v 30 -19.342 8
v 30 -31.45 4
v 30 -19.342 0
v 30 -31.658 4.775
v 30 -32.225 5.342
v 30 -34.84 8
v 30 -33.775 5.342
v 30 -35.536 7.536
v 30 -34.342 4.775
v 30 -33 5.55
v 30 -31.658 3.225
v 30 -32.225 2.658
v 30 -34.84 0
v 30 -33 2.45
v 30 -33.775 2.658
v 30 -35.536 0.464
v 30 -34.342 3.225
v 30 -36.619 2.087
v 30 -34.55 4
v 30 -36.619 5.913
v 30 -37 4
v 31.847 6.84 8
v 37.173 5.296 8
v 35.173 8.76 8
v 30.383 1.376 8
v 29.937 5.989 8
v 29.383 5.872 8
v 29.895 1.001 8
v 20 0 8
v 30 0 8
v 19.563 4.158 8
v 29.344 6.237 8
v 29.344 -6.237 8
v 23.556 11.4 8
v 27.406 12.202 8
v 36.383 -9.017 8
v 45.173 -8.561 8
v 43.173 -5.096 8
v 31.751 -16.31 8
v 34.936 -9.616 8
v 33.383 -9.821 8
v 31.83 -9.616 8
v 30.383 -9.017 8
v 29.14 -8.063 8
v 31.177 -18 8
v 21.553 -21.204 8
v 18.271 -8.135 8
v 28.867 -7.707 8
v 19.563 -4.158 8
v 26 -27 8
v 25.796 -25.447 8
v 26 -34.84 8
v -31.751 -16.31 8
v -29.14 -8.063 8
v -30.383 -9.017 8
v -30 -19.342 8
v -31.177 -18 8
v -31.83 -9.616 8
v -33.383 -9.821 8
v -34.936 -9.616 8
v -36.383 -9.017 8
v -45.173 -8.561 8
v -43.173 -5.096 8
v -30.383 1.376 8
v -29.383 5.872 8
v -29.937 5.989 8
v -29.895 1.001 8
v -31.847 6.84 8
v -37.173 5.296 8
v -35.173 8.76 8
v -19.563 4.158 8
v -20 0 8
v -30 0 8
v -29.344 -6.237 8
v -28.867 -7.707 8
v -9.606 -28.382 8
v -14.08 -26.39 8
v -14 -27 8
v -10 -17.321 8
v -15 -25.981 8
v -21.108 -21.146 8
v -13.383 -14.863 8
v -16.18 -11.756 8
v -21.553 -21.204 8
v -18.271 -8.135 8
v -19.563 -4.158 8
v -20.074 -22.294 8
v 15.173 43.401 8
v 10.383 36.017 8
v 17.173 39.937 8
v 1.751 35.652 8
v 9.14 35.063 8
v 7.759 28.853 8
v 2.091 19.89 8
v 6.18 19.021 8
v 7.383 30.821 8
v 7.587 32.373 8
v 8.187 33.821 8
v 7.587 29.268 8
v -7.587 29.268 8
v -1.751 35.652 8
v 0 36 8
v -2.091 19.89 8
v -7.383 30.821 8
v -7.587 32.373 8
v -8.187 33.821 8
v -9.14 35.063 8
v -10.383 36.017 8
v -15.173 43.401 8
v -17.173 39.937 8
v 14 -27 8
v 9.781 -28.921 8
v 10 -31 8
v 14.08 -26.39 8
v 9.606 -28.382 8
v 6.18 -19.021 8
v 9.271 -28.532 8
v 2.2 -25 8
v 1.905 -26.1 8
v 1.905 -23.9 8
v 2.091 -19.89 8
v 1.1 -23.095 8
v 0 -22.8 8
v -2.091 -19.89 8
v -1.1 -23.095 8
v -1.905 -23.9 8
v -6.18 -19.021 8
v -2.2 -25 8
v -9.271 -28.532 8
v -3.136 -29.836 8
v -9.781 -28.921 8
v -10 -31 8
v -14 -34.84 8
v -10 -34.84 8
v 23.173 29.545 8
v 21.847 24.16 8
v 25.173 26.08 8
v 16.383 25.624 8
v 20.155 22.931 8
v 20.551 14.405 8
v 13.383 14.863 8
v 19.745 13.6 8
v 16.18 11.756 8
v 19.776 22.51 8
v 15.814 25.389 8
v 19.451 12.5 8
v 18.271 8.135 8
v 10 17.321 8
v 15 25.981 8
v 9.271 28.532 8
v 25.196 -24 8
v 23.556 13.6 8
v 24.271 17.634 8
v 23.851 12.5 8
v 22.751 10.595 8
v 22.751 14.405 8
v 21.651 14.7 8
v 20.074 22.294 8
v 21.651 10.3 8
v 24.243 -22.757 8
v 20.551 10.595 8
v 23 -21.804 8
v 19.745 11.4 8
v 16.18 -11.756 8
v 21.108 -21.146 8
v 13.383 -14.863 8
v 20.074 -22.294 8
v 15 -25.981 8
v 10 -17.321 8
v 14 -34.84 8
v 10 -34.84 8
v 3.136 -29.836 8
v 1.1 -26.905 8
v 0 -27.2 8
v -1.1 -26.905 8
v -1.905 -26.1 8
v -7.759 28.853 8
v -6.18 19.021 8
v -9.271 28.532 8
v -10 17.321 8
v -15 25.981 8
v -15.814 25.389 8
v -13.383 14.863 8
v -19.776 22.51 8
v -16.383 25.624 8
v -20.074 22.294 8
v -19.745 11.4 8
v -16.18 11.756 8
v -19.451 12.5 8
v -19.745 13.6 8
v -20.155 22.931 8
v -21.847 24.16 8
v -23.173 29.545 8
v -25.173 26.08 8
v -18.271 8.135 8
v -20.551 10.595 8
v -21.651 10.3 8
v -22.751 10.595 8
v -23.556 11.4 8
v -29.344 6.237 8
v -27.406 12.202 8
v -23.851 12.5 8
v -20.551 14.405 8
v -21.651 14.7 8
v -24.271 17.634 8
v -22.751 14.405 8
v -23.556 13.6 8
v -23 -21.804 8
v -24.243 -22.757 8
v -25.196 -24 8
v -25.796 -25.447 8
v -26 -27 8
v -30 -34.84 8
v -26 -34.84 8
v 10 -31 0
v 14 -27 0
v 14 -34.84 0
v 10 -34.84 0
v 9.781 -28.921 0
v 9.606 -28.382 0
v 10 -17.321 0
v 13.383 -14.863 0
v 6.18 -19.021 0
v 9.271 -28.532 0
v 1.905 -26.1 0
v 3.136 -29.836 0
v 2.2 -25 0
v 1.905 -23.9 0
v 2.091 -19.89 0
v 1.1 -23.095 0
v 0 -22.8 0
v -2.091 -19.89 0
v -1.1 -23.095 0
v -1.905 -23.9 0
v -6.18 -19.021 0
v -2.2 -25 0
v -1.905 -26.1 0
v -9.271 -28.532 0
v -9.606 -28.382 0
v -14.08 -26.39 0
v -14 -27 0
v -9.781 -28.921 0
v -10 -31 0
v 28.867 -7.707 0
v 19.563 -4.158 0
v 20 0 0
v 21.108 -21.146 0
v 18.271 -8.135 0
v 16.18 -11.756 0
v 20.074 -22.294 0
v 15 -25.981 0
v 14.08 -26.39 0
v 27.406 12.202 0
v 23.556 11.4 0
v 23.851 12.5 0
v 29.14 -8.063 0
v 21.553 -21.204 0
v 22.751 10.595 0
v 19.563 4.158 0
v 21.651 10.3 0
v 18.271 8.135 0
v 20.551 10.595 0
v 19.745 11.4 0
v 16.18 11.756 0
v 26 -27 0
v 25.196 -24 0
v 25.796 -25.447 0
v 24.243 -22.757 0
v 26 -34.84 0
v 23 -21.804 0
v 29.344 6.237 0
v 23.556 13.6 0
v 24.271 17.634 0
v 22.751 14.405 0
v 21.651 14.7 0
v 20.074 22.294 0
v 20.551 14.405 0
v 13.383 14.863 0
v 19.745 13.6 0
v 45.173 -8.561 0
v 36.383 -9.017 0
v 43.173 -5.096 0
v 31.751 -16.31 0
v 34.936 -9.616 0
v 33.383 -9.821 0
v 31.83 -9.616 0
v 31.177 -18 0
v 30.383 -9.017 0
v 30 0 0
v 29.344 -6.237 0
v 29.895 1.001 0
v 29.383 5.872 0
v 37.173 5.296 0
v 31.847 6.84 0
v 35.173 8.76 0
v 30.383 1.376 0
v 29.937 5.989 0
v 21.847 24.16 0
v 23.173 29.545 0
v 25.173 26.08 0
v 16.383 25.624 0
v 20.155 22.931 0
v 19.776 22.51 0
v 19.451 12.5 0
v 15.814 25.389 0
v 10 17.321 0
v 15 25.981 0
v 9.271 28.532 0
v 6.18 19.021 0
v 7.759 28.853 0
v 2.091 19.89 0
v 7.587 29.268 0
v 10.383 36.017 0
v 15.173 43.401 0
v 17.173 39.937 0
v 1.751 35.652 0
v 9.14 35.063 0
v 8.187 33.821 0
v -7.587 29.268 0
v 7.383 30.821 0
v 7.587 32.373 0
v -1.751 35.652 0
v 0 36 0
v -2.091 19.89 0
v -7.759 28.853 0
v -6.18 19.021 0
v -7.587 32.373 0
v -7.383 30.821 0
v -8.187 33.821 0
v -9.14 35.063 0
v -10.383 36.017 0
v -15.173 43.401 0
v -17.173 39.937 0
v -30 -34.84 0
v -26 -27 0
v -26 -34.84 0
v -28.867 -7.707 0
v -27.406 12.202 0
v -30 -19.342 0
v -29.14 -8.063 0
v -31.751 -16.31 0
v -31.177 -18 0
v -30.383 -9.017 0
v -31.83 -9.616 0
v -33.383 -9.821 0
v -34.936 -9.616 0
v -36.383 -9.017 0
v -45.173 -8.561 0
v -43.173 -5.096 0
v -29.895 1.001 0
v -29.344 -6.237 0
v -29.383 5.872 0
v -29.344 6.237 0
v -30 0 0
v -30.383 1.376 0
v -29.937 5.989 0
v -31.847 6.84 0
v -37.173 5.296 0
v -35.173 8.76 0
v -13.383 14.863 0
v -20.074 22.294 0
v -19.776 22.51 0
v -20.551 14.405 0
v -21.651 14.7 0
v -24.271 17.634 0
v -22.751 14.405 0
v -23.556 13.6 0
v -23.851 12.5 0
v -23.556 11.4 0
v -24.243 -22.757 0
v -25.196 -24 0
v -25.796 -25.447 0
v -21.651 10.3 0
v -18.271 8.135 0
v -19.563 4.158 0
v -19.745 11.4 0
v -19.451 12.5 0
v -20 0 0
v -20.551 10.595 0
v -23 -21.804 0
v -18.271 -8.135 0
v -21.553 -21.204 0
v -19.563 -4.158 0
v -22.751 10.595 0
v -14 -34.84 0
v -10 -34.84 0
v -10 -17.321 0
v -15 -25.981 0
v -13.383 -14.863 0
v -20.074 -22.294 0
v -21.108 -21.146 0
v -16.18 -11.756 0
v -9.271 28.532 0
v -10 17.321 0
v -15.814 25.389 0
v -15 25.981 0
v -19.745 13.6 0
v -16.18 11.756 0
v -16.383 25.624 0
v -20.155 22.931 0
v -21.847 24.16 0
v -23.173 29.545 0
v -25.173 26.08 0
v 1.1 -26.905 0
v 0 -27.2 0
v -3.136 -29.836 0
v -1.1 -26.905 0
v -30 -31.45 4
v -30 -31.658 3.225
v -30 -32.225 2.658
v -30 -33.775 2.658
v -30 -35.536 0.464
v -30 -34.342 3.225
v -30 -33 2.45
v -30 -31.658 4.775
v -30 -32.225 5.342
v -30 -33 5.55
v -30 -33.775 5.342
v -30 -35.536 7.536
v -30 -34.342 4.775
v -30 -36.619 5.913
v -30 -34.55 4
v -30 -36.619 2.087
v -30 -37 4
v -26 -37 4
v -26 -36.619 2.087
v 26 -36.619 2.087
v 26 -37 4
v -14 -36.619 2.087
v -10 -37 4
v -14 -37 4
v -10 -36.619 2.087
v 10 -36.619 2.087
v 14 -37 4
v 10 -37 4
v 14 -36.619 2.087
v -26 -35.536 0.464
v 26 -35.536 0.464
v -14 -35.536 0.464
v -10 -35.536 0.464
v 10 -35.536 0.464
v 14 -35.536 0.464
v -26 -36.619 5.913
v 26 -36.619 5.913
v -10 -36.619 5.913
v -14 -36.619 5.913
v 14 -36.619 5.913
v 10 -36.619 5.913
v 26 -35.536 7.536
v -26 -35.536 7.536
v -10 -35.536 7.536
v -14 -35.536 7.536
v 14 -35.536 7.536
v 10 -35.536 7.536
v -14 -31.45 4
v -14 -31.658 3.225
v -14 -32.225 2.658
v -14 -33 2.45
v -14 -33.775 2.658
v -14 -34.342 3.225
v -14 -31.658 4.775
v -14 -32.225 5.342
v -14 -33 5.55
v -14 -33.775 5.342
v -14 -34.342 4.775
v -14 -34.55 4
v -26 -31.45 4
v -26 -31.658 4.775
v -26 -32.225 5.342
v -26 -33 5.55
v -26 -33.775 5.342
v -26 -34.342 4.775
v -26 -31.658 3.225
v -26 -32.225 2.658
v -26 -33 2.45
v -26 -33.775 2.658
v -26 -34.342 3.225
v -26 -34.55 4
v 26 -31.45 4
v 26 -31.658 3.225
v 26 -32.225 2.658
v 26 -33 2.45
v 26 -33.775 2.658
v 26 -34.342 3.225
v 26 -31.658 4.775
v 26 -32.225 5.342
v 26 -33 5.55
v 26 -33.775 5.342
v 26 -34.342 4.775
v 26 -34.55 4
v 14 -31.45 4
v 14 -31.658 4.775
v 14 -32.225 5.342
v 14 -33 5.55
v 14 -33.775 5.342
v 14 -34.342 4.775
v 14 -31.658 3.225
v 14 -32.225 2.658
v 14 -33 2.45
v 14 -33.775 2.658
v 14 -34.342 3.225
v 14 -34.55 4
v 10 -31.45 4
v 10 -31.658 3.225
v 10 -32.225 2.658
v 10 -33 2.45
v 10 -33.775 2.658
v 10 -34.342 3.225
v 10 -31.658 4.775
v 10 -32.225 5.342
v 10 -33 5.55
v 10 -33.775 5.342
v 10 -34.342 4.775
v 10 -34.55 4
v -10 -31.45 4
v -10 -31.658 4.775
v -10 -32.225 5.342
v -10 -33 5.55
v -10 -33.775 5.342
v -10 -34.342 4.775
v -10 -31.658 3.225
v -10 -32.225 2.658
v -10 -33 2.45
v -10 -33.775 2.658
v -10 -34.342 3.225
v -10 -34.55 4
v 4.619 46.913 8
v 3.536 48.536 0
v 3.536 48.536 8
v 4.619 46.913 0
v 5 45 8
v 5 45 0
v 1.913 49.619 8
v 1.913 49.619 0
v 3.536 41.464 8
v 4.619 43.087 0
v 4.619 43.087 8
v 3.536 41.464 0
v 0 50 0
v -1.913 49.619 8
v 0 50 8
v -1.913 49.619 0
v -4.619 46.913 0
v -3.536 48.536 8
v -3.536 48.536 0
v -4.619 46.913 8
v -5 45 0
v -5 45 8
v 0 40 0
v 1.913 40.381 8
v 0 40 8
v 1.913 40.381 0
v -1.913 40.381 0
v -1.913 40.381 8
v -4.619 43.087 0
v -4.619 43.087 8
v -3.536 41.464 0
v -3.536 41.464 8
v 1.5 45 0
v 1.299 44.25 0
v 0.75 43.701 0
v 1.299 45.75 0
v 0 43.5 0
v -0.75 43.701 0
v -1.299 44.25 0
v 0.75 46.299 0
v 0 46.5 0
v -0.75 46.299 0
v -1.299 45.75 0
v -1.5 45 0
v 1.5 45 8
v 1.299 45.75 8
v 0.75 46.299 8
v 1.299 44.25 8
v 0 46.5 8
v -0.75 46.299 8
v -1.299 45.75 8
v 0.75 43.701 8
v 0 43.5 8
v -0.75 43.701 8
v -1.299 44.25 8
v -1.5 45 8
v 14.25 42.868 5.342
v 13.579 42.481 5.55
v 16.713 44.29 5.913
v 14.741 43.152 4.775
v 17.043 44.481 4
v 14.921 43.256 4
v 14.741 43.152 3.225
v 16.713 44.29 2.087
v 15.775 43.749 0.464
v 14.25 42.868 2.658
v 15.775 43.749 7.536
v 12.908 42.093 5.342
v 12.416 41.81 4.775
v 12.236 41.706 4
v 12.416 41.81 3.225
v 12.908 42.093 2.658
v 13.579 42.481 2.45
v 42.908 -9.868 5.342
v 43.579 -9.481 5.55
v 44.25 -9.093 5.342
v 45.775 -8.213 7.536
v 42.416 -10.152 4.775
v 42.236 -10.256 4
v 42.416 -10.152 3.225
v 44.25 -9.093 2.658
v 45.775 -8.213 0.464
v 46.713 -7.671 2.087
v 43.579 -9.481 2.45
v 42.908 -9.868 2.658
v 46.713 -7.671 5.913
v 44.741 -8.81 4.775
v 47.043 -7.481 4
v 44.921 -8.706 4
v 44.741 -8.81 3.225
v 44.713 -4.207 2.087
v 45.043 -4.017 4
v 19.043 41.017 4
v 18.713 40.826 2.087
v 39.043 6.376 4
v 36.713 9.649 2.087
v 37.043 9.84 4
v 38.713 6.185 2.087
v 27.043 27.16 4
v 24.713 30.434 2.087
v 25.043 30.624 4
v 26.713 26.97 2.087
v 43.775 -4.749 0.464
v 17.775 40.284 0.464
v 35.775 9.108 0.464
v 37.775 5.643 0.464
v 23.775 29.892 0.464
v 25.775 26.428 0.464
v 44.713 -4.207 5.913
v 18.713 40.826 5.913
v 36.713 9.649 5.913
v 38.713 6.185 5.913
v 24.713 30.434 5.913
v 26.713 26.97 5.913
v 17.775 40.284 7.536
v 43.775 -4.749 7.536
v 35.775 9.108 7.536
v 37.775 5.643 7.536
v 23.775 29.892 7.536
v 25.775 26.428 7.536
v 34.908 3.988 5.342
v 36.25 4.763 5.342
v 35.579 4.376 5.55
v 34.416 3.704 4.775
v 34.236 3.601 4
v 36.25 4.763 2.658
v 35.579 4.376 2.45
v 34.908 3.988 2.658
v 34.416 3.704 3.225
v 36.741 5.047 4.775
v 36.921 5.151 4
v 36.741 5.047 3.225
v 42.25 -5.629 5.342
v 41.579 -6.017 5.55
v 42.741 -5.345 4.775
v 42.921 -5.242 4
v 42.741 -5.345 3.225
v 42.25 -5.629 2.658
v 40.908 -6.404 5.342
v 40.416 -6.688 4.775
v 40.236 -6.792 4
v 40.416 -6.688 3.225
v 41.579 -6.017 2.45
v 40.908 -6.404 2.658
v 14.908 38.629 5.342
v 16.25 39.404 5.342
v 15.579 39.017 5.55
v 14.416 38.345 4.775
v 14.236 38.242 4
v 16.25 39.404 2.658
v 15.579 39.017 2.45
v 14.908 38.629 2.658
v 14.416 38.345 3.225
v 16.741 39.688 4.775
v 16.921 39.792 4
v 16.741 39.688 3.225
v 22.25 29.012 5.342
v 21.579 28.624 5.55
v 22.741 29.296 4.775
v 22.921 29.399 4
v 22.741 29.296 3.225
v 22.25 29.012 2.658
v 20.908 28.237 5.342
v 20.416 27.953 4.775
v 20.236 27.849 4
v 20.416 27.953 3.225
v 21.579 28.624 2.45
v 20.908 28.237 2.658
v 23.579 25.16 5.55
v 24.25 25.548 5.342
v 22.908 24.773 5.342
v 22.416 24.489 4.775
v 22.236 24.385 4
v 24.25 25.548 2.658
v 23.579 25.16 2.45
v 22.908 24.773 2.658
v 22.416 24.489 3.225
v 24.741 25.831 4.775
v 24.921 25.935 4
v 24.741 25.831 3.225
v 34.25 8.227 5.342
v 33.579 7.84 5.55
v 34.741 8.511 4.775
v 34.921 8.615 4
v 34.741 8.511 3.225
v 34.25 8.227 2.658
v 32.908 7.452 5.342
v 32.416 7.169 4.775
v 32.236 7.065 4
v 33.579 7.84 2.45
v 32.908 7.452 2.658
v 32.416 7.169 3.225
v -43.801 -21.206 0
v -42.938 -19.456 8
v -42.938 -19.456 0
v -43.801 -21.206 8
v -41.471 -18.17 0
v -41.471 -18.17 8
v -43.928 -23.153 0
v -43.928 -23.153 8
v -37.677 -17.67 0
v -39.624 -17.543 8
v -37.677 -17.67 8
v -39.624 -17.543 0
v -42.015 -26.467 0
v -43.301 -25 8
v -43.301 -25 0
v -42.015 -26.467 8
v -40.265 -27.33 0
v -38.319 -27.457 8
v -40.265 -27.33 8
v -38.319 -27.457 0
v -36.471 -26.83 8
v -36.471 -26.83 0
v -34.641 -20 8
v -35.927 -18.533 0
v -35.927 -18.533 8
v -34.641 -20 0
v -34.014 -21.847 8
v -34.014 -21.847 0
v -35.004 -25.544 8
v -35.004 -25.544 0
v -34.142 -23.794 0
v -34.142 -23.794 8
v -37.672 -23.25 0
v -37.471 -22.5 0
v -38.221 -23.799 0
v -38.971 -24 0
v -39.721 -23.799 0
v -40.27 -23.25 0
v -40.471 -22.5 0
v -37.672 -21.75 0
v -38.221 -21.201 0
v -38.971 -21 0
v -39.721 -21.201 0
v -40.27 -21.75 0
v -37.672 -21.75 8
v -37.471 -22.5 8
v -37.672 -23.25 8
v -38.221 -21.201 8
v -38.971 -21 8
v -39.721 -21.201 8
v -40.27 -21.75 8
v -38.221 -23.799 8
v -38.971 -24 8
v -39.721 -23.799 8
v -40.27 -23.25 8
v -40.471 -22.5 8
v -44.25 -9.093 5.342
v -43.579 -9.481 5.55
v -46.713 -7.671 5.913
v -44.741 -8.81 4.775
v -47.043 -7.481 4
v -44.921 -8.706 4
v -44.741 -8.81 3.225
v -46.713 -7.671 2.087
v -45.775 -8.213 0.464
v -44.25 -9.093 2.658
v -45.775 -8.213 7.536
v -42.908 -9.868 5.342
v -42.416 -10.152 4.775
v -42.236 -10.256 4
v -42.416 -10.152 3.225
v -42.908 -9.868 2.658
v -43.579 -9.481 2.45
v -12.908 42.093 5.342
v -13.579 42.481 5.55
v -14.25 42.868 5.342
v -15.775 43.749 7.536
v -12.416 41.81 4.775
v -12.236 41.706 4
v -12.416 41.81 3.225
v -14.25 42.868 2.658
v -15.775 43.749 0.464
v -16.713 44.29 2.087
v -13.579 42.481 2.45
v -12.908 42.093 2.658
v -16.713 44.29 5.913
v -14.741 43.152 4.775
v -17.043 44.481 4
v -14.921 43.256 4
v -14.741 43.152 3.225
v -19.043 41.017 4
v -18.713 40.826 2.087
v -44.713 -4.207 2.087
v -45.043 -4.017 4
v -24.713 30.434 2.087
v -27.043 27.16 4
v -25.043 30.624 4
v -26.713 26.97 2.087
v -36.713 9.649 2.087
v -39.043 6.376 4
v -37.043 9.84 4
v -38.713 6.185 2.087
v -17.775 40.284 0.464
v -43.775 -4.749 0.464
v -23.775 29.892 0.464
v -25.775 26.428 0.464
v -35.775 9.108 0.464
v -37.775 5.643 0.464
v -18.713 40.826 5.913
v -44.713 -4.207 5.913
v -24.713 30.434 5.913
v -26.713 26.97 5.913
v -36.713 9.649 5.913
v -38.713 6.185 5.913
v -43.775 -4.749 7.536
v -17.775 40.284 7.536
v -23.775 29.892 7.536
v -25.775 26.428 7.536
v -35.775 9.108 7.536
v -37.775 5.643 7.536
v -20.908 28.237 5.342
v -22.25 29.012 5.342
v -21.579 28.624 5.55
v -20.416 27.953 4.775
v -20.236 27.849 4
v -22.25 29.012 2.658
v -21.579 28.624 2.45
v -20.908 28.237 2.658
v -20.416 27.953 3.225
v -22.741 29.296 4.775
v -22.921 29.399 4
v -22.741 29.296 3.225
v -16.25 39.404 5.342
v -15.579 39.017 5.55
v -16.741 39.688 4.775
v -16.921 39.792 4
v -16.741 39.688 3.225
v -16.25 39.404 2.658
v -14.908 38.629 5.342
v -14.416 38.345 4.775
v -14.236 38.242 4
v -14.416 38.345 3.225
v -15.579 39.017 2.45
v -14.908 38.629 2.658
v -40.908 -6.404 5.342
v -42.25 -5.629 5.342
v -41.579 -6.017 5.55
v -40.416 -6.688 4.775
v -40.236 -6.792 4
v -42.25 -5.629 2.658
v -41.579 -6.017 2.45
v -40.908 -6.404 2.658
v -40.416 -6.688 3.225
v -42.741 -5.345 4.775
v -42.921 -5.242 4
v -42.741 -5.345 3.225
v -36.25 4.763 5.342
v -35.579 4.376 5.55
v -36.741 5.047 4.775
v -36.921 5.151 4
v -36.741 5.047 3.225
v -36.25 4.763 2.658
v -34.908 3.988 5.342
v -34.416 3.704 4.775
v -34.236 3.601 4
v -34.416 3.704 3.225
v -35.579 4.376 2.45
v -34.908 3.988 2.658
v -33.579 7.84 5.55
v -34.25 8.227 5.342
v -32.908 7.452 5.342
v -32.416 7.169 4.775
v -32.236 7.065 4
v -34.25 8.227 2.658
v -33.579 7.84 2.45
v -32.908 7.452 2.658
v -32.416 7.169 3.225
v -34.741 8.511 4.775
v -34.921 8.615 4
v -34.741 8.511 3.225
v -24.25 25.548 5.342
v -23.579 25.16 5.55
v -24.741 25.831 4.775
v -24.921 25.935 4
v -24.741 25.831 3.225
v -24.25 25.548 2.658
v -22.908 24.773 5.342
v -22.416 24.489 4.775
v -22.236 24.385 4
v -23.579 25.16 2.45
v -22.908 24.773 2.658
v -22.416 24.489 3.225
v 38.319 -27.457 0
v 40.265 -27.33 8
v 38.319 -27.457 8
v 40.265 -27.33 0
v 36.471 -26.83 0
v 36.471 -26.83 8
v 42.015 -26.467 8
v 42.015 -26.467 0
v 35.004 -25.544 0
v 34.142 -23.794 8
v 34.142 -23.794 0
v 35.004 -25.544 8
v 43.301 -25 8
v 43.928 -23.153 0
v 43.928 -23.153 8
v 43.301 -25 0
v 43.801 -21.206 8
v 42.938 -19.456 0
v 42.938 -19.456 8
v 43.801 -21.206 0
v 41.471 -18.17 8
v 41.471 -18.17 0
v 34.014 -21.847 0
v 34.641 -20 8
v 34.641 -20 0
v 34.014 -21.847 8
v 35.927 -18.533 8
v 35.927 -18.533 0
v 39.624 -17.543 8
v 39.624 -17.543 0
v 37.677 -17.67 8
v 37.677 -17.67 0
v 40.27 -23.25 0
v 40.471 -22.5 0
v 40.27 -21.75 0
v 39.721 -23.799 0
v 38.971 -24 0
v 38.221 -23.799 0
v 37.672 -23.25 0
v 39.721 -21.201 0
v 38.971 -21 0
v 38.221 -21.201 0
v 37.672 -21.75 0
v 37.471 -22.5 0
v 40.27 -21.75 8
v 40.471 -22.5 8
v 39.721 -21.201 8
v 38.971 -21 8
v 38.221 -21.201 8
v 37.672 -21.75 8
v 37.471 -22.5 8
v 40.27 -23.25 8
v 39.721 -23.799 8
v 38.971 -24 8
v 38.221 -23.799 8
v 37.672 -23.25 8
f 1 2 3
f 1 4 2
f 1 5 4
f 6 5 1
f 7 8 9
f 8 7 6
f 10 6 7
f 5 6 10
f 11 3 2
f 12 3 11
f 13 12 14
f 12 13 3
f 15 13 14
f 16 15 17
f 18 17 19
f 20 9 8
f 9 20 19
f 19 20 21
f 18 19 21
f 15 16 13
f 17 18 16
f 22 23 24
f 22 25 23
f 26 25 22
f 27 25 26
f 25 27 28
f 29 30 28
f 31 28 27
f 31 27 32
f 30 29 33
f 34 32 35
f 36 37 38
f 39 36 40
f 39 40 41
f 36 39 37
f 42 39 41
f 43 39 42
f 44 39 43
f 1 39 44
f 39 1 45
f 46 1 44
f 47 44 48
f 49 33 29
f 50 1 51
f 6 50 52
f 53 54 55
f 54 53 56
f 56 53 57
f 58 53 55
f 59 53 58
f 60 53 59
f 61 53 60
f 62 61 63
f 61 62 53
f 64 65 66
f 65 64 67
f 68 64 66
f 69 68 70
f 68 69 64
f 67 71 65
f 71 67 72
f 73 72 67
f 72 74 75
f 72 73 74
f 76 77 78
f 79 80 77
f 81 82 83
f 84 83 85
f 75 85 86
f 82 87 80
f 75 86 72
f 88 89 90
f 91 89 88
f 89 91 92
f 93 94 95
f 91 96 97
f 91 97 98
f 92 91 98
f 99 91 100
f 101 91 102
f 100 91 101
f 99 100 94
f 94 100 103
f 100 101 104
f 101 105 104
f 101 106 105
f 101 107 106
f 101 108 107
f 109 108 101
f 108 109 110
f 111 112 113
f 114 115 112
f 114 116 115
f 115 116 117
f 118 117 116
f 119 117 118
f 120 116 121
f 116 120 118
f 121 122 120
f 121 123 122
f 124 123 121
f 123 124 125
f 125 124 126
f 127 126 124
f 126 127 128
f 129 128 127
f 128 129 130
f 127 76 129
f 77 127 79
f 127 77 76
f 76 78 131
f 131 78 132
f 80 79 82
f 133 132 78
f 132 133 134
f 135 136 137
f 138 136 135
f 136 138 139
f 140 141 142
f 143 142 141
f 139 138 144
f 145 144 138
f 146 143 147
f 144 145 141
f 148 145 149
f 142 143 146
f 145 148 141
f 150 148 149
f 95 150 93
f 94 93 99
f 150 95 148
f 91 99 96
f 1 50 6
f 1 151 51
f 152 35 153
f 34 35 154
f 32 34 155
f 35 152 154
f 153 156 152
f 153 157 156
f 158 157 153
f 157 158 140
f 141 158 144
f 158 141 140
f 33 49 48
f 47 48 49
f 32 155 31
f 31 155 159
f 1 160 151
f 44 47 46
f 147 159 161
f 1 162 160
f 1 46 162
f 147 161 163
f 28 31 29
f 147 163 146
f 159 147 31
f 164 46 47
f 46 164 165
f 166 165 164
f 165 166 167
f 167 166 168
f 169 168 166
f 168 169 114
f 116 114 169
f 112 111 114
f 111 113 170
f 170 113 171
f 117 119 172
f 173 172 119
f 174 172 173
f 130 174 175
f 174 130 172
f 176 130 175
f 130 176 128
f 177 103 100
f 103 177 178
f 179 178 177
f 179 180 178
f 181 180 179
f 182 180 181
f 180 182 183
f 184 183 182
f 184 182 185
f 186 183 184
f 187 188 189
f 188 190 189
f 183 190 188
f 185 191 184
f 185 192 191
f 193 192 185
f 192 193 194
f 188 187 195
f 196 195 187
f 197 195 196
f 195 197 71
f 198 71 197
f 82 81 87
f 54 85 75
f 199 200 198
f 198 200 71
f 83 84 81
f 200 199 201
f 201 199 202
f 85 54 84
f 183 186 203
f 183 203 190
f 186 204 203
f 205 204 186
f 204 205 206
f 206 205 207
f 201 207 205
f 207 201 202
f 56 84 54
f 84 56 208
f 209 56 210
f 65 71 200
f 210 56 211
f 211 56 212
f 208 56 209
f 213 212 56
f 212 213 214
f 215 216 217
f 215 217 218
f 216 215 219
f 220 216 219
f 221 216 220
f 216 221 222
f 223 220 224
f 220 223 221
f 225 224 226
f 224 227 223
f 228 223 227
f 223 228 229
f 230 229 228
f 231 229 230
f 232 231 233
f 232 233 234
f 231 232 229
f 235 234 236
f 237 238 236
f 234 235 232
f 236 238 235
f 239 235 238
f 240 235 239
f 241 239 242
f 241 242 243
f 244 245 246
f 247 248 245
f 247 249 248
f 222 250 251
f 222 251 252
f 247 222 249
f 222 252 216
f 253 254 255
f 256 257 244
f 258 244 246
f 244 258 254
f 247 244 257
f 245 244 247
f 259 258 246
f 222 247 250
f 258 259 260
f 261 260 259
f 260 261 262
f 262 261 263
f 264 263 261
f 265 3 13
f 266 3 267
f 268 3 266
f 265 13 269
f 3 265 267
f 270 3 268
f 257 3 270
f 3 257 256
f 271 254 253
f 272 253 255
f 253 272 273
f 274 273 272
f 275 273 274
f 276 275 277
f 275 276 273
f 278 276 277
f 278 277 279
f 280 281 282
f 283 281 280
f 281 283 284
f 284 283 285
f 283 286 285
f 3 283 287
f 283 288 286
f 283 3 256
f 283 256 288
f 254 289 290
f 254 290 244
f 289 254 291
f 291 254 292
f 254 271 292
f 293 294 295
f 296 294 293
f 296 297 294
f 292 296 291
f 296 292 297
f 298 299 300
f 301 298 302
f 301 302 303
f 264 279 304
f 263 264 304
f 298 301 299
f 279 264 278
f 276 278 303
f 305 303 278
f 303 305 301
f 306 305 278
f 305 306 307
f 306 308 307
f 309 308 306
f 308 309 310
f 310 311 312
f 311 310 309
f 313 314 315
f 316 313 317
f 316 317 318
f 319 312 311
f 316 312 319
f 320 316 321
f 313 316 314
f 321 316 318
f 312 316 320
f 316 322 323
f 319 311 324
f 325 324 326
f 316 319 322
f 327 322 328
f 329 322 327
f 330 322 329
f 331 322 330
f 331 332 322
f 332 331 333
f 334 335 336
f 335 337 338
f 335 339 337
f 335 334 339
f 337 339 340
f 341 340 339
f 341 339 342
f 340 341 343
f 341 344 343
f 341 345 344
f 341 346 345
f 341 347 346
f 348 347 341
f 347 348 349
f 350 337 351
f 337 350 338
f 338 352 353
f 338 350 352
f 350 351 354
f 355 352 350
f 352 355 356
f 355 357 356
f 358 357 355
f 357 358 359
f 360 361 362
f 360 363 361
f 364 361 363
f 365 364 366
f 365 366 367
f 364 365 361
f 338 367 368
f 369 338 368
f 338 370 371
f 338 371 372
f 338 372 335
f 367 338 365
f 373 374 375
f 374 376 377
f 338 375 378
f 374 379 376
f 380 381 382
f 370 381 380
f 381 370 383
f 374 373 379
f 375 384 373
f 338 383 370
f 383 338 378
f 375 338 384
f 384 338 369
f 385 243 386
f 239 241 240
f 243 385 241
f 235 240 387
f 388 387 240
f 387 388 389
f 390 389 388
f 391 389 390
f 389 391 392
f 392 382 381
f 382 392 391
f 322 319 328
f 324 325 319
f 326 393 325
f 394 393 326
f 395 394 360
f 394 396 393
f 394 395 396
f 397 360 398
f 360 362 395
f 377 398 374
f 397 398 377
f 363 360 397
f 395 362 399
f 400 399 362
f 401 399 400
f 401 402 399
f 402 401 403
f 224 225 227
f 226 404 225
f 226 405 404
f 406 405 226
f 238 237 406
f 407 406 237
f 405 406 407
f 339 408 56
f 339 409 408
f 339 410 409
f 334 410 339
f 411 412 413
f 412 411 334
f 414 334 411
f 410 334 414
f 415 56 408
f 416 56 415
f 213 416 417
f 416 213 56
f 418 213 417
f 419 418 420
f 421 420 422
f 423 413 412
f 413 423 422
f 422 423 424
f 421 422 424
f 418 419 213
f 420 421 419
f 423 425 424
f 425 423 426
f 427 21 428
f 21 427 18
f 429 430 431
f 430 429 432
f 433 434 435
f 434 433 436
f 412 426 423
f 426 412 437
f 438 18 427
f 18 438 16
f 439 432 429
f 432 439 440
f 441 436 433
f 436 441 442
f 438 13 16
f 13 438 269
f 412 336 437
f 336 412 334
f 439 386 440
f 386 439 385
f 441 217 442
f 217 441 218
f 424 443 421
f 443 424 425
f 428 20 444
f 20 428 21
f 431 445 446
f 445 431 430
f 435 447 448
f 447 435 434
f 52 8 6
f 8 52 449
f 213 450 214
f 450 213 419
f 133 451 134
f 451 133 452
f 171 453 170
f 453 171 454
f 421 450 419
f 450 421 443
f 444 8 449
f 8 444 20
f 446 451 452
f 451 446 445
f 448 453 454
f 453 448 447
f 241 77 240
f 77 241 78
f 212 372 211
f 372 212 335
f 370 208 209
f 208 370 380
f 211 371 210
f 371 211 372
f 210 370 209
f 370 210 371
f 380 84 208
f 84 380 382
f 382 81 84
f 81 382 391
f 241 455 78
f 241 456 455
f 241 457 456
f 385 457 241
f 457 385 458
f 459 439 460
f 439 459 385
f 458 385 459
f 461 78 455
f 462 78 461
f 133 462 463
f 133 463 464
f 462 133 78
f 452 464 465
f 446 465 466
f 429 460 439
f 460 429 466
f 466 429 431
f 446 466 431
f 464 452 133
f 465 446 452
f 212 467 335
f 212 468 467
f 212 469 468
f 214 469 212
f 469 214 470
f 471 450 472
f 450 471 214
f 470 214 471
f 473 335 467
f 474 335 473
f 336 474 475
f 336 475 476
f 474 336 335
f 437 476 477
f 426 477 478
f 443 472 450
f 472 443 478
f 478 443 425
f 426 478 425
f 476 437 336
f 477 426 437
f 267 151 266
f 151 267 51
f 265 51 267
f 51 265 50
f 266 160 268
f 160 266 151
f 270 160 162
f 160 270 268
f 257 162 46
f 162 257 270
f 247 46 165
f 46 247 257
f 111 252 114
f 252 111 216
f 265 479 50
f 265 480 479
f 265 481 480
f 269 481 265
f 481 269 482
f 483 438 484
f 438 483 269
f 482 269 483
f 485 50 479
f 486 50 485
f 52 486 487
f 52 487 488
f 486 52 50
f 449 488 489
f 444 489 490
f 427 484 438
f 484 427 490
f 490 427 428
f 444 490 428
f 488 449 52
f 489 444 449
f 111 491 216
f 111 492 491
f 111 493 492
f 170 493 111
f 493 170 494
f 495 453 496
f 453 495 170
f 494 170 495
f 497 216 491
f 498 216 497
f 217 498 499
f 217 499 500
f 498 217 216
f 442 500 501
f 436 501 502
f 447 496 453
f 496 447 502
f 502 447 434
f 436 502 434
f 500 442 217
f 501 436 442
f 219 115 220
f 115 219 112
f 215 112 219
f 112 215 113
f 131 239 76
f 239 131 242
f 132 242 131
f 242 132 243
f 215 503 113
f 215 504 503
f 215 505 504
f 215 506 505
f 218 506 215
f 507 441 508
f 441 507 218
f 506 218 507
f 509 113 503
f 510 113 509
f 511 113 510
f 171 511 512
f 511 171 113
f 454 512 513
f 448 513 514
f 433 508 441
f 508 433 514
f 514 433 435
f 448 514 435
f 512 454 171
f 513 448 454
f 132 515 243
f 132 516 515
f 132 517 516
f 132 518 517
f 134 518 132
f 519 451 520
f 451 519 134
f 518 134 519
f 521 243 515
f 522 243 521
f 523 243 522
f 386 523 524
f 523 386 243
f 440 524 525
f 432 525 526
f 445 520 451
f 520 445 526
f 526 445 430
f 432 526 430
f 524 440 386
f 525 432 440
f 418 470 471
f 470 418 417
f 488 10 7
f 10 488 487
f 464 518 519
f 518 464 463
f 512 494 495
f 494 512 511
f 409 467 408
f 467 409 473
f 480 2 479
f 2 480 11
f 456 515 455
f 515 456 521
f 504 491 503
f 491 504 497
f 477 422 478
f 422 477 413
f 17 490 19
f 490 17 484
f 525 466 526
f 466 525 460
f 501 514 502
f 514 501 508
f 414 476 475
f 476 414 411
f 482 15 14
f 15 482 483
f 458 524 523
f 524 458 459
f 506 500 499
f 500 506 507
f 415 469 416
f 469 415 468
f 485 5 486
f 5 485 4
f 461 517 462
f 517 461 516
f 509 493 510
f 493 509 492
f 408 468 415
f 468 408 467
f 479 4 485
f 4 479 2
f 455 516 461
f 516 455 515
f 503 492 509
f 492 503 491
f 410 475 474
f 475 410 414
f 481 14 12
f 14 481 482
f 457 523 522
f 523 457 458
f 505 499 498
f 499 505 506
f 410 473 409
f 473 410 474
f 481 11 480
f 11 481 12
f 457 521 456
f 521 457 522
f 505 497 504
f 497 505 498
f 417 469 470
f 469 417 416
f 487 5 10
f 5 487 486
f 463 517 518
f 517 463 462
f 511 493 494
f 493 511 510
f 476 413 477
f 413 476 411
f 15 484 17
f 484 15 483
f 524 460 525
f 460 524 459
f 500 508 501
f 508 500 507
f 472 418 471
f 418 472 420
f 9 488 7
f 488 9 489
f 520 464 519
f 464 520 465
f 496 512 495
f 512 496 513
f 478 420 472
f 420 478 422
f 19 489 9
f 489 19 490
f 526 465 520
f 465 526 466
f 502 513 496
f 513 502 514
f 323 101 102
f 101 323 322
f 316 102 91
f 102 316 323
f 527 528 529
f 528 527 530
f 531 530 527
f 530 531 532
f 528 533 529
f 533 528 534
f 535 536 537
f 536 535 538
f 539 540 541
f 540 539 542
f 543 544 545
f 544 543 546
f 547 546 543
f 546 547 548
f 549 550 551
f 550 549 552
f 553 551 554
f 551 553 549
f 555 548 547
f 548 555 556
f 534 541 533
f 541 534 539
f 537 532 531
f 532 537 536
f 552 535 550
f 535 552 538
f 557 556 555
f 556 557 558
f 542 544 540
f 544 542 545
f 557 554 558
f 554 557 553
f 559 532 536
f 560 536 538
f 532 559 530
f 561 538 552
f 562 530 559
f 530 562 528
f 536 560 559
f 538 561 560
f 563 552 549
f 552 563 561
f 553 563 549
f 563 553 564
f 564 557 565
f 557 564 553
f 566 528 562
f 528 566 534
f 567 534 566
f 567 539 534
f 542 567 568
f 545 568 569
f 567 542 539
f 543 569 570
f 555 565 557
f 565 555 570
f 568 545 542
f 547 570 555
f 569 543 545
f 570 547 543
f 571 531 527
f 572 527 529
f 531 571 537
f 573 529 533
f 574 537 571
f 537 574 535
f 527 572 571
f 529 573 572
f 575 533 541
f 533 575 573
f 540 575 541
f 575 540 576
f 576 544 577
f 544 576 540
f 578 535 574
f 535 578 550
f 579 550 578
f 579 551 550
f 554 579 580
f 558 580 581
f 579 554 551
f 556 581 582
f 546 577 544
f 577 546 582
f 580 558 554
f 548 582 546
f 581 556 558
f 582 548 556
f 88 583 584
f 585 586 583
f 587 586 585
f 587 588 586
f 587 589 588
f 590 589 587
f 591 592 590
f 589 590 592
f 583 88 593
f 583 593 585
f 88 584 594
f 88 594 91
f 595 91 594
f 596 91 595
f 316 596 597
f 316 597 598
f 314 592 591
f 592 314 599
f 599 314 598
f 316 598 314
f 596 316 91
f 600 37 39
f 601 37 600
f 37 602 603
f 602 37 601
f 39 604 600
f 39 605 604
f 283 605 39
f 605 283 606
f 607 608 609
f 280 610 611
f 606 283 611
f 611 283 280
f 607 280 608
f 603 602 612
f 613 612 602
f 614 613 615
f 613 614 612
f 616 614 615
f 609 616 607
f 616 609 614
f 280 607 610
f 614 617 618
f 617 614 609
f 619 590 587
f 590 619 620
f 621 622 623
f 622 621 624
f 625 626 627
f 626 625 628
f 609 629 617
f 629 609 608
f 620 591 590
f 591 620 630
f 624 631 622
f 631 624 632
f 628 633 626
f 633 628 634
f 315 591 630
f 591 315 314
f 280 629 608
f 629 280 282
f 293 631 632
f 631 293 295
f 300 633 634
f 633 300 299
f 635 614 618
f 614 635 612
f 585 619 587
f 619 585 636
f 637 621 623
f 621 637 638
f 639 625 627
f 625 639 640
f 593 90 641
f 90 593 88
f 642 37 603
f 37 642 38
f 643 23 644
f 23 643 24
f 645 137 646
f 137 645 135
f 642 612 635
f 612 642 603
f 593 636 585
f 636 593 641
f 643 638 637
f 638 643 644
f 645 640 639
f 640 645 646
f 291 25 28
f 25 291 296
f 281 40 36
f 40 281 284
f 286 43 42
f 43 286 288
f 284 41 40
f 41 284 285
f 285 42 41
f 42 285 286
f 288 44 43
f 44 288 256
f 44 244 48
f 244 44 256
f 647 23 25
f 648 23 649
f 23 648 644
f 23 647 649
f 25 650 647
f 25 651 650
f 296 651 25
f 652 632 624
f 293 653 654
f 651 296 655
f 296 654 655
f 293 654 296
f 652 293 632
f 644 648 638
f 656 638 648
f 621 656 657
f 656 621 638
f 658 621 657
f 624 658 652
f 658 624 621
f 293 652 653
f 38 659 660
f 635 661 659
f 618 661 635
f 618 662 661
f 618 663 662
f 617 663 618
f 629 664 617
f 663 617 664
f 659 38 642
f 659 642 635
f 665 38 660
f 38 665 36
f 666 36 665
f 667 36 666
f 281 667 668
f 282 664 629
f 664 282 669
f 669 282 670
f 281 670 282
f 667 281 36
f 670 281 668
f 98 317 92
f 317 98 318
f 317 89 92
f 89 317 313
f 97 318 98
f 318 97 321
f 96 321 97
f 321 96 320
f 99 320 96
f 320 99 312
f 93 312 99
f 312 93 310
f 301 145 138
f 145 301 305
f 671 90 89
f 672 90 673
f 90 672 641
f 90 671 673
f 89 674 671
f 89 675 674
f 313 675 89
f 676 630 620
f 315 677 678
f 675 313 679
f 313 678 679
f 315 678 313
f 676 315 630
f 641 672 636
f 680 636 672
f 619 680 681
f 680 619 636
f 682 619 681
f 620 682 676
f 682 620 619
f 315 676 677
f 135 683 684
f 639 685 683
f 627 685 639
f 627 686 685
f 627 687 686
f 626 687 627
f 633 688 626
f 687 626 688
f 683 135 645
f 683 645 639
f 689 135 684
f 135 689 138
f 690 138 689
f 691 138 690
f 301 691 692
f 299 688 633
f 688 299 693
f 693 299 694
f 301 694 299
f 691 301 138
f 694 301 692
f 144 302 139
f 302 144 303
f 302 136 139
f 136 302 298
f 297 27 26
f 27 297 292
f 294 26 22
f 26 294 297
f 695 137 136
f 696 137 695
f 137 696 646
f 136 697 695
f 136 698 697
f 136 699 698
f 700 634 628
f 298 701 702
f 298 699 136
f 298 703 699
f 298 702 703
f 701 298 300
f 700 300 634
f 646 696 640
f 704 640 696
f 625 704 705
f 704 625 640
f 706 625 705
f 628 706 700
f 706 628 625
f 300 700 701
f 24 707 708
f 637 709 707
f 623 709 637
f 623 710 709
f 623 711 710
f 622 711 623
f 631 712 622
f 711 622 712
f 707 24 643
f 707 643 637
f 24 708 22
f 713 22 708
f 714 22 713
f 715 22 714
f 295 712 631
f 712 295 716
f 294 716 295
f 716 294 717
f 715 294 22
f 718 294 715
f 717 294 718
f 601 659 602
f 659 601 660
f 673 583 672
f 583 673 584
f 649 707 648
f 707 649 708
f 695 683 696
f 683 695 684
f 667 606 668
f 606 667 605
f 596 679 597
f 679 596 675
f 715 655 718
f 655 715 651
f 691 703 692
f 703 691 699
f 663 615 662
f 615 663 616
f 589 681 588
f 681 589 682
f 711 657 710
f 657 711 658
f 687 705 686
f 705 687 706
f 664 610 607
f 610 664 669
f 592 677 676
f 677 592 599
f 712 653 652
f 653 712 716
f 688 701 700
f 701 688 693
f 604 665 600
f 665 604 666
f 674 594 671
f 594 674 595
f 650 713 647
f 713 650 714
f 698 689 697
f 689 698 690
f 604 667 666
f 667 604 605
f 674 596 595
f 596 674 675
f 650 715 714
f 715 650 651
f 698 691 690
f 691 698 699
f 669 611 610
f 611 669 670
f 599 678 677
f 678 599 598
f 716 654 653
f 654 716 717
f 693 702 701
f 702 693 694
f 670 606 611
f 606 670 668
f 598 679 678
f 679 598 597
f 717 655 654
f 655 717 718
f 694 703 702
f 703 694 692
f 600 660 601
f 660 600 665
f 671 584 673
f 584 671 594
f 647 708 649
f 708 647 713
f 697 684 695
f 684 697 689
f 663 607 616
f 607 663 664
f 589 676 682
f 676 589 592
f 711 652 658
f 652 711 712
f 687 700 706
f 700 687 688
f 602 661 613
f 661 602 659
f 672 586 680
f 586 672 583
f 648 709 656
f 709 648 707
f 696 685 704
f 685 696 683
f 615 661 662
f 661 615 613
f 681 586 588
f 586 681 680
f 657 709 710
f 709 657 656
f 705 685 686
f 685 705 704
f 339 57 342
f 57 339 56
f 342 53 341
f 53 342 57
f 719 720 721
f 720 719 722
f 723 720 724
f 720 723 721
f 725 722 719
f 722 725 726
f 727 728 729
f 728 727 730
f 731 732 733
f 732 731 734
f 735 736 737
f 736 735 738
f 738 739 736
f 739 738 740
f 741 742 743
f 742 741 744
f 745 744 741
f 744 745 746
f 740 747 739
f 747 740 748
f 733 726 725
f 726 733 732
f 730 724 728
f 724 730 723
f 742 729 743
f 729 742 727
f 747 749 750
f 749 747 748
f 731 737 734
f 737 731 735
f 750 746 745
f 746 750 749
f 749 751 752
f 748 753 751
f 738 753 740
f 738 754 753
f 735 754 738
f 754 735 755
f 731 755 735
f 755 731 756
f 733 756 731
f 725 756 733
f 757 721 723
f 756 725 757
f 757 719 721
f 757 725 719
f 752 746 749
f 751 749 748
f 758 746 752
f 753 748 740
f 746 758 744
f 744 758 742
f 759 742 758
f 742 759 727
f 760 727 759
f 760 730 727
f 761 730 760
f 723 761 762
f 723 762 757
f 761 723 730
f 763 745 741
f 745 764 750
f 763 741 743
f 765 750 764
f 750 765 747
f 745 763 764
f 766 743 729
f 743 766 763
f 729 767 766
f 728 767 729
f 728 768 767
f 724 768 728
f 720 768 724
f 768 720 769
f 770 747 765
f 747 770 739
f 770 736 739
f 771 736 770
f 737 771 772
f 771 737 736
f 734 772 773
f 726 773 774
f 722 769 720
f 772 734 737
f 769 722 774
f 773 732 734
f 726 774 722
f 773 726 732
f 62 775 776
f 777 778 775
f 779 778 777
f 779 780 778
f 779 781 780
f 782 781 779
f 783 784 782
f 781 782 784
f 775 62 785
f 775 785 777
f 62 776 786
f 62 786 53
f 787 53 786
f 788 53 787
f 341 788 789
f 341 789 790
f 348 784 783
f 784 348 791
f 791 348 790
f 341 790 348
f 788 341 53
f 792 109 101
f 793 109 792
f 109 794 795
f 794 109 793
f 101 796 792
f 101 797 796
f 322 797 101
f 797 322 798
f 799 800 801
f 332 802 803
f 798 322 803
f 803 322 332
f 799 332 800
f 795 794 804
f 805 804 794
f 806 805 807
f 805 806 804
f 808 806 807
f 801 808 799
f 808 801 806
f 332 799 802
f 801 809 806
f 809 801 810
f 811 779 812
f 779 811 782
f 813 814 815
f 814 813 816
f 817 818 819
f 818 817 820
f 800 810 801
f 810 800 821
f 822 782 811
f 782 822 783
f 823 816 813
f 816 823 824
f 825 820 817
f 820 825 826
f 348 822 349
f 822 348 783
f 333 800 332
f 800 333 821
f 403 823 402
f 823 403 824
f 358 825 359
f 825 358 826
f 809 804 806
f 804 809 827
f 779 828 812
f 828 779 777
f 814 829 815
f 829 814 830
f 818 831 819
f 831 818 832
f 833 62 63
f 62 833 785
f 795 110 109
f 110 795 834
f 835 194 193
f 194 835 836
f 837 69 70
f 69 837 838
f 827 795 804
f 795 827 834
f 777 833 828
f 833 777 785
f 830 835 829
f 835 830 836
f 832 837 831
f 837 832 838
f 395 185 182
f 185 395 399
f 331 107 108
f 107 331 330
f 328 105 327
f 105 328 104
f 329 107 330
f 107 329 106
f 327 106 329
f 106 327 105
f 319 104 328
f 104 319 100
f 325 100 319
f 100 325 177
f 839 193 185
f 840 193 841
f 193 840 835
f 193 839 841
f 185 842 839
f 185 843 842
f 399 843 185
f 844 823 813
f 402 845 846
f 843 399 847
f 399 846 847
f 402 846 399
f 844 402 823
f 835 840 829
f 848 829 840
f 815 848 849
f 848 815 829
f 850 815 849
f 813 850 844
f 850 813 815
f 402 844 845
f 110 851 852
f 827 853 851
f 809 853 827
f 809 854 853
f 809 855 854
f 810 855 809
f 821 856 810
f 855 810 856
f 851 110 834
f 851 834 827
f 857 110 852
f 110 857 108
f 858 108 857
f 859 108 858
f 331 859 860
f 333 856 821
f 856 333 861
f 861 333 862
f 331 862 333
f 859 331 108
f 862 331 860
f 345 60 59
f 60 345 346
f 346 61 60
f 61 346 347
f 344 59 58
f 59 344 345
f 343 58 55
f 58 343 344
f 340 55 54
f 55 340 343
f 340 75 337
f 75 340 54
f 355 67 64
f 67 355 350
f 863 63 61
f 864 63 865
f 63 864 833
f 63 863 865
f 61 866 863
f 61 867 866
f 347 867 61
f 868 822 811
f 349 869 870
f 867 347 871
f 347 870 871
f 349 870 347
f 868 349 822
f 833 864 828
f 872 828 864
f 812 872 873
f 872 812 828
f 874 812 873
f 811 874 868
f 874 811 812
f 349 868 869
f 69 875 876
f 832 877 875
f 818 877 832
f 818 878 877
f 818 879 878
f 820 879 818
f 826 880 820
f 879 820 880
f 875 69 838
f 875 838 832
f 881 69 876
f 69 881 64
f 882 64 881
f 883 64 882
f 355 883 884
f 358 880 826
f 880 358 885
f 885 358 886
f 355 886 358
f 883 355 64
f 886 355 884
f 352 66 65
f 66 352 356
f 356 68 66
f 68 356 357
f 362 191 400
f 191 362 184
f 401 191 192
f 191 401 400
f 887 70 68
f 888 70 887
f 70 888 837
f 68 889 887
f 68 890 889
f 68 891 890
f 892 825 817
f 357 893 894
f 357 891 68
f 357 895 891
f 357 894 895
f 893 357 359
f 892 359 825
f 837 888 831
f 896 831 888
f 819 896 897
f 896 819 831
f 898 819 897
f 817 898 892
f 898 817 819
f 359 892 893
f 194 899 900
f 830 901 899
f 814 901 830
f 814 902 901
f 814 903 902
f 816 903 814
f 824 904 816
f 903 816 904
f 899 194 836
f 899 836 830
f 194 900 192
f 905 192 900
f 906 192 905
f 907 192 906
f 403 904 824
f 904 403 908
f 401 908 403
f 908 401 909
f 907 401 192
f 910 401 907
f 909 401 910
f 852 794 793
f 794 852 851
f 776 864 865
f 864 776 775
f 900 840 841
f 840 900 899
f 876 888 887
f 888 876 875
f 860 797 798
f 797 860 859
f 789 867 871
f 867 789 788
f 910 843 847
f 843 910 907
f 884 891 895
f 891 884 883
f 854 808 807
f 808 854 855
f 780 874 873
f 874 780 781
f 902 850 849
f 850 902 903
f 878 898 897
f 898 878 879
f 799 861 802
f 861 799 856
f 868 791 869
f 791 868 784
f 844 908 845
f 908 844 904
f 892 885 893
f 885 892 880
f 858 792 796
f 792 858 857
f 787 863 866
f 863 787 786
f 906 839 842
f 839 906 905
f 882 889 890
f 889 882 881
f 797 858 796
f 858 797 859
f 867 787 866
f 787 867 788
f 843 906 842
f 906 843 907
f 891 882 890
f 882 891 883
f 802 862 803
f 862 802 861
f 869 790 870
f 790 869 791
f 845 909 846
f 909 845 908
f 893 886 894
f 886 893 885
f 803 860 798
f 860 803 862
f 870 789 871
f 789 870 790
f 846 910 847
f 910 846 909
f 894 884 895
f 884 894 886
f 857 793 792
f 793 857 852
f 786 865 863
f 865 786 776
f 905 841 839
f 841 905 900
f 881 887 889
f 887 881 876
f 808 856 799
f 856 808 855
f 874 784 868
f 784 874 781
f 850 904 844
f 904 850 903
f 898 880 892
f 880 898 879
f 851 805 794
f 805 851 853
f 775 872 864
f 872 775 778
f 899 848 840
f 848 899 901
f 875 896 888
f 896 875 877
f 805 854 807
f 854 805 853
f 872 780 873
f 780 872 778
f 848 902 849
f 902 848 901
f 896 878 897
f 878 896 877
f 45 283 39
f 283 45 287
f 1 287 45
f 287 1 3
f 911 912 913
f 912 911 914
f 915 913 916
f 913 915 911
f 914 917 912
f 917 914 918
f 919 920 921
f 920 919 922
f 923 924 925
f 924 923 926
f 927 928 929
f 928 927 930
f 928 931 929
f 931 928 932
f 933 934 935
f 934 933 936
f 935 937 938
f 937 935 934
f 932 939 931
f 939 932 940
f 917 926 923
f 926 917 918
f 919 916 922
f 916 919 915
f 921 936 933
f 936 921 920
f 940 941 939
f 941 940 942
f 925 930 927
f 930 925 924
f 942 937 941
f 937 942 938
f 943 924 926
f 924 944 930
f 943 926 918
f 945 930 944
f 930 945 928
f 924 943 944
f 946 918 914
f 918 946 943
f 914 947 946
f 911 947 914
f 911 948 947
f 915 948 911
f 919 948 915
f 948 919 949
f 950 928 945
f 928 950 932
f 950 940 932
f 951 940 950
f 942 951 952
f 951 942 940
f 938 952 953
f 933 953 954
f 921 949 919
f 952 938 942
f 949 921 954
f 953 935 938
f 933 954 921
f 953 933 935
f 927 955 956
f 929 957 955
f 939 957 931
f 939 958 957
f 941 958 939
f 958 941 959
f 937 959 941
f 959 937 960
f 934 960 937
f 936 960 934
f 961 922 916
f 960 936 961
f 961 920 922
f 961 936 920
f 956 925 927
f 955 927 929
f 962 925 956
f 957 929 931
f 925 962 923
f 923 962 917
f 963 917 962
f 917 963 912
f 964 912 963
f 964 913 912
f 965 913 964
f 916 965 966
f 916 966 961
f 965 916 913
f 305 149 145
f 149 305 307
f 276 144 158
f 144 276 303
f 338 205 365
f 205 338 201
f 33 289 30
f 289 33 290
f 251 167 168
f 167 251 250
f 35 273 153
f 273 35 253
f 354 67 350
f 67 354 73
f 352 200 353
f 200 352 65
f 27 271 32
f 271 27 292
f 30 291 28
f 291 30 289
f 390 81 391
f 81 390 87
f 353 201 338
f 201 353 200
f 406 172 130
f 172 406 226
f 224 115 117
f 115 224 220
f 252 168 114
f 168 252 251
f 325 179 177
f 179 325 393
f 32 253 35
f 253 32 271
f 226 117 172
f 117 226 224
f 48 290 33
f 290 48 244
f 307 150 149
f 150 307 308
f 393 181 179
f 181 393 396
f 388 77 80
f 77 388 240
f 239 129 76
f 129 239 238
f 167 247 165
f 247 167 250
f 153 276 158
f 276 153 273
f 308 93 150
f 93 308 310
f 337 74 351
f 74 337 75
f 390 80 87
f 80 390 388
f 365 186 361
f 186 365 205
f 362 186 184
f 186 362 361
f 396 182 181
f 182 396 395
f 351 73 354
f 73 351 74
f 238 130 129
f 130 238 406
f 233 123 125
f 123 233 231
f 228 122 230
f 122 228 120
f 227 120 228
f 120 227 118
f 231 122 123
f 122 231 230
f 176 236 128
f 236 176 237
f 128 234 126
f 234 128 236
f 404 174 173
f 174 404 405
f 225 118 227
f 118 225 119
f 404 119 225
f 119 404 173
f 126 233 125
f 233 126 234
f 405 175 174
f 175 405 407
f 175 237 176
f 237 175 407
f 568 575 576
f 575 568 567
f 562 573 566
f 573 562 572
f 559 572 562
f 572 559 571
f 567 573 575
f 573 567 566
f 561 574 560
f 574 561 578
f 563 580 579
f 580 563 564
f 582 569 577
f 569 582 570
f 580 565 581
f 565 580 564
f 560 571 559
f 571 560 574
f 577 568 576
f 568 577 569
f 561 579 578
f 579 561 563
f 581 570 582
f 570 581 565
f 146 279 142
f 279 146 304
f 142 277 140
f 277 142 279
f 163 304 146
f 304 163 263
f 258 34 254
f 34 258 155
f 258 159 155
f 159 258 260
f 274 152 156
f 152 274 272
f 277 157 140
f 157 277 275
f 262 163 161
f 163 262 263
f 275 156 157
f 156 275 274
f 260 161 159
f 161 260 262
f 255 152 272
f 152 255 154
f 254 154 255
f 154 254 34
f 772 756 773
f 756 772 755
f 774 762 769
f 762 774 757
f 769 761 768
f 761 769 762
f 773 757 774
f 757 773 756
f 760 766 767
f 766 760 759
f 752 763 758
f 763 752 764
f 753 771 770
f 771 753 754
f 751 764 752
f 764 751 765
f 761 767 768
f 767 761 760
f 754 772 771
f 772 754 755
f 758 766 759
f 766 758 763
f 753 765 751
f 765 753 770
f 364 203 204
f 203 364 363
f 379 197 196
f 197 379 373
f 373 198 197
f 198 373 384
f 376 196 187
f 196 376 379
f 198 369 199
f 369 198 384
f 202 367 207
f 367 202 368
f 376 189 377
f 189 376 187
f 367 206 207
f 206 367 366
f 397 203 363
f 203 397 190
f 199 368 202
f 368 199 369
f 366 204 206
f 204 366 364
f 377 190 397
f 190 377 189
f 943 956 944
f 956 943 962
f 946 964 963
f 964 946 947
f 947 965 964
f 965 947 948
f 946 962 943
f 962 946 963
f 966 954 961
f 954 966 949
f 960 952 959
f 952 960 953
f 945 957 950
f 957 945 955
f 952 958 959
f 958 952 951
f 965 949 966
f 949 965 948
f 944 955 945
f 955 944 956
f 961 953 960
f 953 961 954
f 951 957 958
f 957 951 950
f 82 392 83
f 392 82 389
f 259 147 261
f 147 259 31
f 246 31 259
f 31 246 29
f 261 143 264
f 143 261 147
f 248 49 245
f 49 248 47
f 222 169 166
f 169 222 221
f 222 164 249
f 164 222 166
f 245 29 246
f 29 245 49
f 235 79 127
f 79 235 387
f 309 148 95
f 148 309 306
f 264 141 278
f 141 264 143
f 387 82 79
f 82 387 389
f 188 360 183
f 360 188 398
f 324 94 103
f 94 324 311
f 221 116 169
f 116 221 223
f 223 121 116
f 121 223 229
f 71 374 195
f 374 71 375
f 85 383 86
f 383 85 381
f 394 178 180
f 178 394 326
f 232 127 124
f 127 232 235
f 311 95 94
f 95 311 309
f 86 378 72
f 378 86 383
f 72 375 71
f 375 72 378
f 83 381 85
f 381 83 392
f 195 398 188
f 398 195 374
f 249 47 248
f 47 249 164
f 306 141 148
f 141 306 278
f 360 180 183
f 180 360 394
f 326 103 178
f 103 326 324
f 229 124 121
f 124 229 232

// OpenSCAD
// file: linear_bushing.scad
module linear_bushing(inside_diameter, inside_factor, outside_diameter,
					  height, sides, angle, wall) {
	intersection() {
		union() {
			difference() {
				cylinder(r=outside_diameter/2, h=height,
						 center=true, $fn=sides*2);
				cylinder(r=outside_diameter/2-wall, h=height+1,
						 center=true, $fn=sides*2);
			}
			for (side = [1 : sides]) {
				rotate([0, 0, 360 * side / sides]) {
					translate([outside_diameter/2, 0, 0])
						rotate([0, 0, angle])
						cube([(outside_diameter-inside_diameter*inside_factor)
							  /cos(angle), wall, height], center=true);
				}
			}
		}
		cylinder(r=outside_diameter/2, h=height, center=true, $fn=sides*2);
	}
}

// This will produce a test grid for wall thickness and inside_factor, then
// you can try which size fits best for your printer and slicer settings.

for (x = [0 : 0]) {
	translate([20*x, 0, 0]) {
		linear_bushing(inside_diameter=8, inside_factor=0.975+0.005*x,
					   outside_diameter=15,
					   height=24, sides=16, angle=20, wall=0.9);
	}
}
// file: carriage.scad
use <linear_bushing.scad>;

height = 16;

offset = 20;
cutout = 12;

module parallel_joints() {
	difference() {
		union() {
			translate([0, 1, 0])
			intersection() {
				cube([60, 20, 8], center=true);
				rotate([0, 90]) cylinder(r=5, h=60, center=true);
			}
			translate([0, 10, 0]) cube([60, 20, 8], center=true);
		}
		rotate([0, 90, 0]) cylinder(r=1.55, h=80, center=true, $fn=12);

		for (x = [-offset, offset]) {
			translate([x, 6, 0])
				cylinder(r=cutout/2, h=10, center=true, $fn=24);
			translate([x, -4, 0])
				cube([cutout, 20, 10], center=true);
		}
		translate([0, 2, 0]) {
			cylinder(r=10, h=10, center=true);
			translate([0, -5, 0]) cube([20, 10, 10], center=true);
		}
	}
}

rotate([0, 0, 45])
difference() {
union() {
	difference() {
		union() {
			translate([0, -4, 0]) cube([60, 8, height], center=true);

			for (x = [-30, 30]) {
				translate([x, -1.5, 0])
					cylinder(r=10, h=height, center=true, $fn=36);
			}

			translate([0, -20, -height/2+4]) parallel_joints();
		}
		for (x = [-30, 30]) {
			translate([x, 0, 0])
				cylinder(r=7, h=height+1, center=true);
			translate([x, 15, 0])
				cylinder(r=13, h=height+1, center=true);
			translate([x, -22, 2.01]) rotate([0, 0, x])
				cube([1.5, 60, 4], center=true);
			translate([x*0.51, 1, 0])
				cylinder(r=5, h=height+1, center=true, $fn=24);
		}

		cube([30, 8, height+1], center=true);
	}
	for (x = [-30, 30]) {
		translate([x, 0, 4])
			linear_bushing(inside_diameter=8, inside_factor=0.975,
						   outside_diameter=15,
						   height=24, sides=16, angle=20, wall=0.9);
	}
	translate([8, 2, 0]) cube([3.5, 13, height], center=true);
}
	translate([8, 3, 3]) cube([5, 9, 3], center=true);
	translate([8, 3, -3]) cube([5, 9, 3], center=true);
}
// file: configuration.scad
// Rostock Motor End from Jcrocholl modified by Kolergy to:
//    - Take 12x1000mm smooth rods and KB-12-WW Linear Bearings
//    - Increased base height to locate electronics below the base
//    - Stand on three feets


motor_end_height      =  64;  // Was 44
idler_end_height      =  28;
carriage_height       =  32; // Adapted to cover full length +2 of the Linear bearing
platform_thickness    =   8;
bed_thickness         =  12;
pcb_thickness         =   2;
smooth_rod_length     =1000;
platform_hinge_offset =  33;
carriage_hinge_offset =  22;
tower_radius          = 300;
rod_length            = tower_radius * 1.44;
// main file
include <configuration.scad>
use <carriage.scad>

h=platform_thickness;

cutout = 12.5;
inset = 6;

module platform() {
  translate([0, 0, h/2]) 
  difference() {
    union() {
      for (a = [0:120:359]) {
        rotate([0, 0, a]) {
          translate([0, -platform_hinge_offset, 0]) parallel_joints();
          // Close little triangle holes.
          translate([0, 31, 0]) cylinder(r=5, h=h, center=true);
          // Holder for adjustable bottom endstops.
          translate([0, 45, 0]) cylinder(r=5, h=h, center=true);
        }
      }
      cylinder(r=30, h=h, center=true);
    }
    cylinder(r=20, h=h+12, center=true);
    for (a = [0:2]) {
      rotate(a*120) {
        translate([0, -25, 0])
          cylinder(r=2.2, h=h+1, center=true, $fn=12);
        // Screw holes for adjustable bottom endstops.
        translate([0, 45, 0])
          #cylinder(r=1.5, h=h+1, center=true, $fn=12);
      }
    }
  }
}

platform();
